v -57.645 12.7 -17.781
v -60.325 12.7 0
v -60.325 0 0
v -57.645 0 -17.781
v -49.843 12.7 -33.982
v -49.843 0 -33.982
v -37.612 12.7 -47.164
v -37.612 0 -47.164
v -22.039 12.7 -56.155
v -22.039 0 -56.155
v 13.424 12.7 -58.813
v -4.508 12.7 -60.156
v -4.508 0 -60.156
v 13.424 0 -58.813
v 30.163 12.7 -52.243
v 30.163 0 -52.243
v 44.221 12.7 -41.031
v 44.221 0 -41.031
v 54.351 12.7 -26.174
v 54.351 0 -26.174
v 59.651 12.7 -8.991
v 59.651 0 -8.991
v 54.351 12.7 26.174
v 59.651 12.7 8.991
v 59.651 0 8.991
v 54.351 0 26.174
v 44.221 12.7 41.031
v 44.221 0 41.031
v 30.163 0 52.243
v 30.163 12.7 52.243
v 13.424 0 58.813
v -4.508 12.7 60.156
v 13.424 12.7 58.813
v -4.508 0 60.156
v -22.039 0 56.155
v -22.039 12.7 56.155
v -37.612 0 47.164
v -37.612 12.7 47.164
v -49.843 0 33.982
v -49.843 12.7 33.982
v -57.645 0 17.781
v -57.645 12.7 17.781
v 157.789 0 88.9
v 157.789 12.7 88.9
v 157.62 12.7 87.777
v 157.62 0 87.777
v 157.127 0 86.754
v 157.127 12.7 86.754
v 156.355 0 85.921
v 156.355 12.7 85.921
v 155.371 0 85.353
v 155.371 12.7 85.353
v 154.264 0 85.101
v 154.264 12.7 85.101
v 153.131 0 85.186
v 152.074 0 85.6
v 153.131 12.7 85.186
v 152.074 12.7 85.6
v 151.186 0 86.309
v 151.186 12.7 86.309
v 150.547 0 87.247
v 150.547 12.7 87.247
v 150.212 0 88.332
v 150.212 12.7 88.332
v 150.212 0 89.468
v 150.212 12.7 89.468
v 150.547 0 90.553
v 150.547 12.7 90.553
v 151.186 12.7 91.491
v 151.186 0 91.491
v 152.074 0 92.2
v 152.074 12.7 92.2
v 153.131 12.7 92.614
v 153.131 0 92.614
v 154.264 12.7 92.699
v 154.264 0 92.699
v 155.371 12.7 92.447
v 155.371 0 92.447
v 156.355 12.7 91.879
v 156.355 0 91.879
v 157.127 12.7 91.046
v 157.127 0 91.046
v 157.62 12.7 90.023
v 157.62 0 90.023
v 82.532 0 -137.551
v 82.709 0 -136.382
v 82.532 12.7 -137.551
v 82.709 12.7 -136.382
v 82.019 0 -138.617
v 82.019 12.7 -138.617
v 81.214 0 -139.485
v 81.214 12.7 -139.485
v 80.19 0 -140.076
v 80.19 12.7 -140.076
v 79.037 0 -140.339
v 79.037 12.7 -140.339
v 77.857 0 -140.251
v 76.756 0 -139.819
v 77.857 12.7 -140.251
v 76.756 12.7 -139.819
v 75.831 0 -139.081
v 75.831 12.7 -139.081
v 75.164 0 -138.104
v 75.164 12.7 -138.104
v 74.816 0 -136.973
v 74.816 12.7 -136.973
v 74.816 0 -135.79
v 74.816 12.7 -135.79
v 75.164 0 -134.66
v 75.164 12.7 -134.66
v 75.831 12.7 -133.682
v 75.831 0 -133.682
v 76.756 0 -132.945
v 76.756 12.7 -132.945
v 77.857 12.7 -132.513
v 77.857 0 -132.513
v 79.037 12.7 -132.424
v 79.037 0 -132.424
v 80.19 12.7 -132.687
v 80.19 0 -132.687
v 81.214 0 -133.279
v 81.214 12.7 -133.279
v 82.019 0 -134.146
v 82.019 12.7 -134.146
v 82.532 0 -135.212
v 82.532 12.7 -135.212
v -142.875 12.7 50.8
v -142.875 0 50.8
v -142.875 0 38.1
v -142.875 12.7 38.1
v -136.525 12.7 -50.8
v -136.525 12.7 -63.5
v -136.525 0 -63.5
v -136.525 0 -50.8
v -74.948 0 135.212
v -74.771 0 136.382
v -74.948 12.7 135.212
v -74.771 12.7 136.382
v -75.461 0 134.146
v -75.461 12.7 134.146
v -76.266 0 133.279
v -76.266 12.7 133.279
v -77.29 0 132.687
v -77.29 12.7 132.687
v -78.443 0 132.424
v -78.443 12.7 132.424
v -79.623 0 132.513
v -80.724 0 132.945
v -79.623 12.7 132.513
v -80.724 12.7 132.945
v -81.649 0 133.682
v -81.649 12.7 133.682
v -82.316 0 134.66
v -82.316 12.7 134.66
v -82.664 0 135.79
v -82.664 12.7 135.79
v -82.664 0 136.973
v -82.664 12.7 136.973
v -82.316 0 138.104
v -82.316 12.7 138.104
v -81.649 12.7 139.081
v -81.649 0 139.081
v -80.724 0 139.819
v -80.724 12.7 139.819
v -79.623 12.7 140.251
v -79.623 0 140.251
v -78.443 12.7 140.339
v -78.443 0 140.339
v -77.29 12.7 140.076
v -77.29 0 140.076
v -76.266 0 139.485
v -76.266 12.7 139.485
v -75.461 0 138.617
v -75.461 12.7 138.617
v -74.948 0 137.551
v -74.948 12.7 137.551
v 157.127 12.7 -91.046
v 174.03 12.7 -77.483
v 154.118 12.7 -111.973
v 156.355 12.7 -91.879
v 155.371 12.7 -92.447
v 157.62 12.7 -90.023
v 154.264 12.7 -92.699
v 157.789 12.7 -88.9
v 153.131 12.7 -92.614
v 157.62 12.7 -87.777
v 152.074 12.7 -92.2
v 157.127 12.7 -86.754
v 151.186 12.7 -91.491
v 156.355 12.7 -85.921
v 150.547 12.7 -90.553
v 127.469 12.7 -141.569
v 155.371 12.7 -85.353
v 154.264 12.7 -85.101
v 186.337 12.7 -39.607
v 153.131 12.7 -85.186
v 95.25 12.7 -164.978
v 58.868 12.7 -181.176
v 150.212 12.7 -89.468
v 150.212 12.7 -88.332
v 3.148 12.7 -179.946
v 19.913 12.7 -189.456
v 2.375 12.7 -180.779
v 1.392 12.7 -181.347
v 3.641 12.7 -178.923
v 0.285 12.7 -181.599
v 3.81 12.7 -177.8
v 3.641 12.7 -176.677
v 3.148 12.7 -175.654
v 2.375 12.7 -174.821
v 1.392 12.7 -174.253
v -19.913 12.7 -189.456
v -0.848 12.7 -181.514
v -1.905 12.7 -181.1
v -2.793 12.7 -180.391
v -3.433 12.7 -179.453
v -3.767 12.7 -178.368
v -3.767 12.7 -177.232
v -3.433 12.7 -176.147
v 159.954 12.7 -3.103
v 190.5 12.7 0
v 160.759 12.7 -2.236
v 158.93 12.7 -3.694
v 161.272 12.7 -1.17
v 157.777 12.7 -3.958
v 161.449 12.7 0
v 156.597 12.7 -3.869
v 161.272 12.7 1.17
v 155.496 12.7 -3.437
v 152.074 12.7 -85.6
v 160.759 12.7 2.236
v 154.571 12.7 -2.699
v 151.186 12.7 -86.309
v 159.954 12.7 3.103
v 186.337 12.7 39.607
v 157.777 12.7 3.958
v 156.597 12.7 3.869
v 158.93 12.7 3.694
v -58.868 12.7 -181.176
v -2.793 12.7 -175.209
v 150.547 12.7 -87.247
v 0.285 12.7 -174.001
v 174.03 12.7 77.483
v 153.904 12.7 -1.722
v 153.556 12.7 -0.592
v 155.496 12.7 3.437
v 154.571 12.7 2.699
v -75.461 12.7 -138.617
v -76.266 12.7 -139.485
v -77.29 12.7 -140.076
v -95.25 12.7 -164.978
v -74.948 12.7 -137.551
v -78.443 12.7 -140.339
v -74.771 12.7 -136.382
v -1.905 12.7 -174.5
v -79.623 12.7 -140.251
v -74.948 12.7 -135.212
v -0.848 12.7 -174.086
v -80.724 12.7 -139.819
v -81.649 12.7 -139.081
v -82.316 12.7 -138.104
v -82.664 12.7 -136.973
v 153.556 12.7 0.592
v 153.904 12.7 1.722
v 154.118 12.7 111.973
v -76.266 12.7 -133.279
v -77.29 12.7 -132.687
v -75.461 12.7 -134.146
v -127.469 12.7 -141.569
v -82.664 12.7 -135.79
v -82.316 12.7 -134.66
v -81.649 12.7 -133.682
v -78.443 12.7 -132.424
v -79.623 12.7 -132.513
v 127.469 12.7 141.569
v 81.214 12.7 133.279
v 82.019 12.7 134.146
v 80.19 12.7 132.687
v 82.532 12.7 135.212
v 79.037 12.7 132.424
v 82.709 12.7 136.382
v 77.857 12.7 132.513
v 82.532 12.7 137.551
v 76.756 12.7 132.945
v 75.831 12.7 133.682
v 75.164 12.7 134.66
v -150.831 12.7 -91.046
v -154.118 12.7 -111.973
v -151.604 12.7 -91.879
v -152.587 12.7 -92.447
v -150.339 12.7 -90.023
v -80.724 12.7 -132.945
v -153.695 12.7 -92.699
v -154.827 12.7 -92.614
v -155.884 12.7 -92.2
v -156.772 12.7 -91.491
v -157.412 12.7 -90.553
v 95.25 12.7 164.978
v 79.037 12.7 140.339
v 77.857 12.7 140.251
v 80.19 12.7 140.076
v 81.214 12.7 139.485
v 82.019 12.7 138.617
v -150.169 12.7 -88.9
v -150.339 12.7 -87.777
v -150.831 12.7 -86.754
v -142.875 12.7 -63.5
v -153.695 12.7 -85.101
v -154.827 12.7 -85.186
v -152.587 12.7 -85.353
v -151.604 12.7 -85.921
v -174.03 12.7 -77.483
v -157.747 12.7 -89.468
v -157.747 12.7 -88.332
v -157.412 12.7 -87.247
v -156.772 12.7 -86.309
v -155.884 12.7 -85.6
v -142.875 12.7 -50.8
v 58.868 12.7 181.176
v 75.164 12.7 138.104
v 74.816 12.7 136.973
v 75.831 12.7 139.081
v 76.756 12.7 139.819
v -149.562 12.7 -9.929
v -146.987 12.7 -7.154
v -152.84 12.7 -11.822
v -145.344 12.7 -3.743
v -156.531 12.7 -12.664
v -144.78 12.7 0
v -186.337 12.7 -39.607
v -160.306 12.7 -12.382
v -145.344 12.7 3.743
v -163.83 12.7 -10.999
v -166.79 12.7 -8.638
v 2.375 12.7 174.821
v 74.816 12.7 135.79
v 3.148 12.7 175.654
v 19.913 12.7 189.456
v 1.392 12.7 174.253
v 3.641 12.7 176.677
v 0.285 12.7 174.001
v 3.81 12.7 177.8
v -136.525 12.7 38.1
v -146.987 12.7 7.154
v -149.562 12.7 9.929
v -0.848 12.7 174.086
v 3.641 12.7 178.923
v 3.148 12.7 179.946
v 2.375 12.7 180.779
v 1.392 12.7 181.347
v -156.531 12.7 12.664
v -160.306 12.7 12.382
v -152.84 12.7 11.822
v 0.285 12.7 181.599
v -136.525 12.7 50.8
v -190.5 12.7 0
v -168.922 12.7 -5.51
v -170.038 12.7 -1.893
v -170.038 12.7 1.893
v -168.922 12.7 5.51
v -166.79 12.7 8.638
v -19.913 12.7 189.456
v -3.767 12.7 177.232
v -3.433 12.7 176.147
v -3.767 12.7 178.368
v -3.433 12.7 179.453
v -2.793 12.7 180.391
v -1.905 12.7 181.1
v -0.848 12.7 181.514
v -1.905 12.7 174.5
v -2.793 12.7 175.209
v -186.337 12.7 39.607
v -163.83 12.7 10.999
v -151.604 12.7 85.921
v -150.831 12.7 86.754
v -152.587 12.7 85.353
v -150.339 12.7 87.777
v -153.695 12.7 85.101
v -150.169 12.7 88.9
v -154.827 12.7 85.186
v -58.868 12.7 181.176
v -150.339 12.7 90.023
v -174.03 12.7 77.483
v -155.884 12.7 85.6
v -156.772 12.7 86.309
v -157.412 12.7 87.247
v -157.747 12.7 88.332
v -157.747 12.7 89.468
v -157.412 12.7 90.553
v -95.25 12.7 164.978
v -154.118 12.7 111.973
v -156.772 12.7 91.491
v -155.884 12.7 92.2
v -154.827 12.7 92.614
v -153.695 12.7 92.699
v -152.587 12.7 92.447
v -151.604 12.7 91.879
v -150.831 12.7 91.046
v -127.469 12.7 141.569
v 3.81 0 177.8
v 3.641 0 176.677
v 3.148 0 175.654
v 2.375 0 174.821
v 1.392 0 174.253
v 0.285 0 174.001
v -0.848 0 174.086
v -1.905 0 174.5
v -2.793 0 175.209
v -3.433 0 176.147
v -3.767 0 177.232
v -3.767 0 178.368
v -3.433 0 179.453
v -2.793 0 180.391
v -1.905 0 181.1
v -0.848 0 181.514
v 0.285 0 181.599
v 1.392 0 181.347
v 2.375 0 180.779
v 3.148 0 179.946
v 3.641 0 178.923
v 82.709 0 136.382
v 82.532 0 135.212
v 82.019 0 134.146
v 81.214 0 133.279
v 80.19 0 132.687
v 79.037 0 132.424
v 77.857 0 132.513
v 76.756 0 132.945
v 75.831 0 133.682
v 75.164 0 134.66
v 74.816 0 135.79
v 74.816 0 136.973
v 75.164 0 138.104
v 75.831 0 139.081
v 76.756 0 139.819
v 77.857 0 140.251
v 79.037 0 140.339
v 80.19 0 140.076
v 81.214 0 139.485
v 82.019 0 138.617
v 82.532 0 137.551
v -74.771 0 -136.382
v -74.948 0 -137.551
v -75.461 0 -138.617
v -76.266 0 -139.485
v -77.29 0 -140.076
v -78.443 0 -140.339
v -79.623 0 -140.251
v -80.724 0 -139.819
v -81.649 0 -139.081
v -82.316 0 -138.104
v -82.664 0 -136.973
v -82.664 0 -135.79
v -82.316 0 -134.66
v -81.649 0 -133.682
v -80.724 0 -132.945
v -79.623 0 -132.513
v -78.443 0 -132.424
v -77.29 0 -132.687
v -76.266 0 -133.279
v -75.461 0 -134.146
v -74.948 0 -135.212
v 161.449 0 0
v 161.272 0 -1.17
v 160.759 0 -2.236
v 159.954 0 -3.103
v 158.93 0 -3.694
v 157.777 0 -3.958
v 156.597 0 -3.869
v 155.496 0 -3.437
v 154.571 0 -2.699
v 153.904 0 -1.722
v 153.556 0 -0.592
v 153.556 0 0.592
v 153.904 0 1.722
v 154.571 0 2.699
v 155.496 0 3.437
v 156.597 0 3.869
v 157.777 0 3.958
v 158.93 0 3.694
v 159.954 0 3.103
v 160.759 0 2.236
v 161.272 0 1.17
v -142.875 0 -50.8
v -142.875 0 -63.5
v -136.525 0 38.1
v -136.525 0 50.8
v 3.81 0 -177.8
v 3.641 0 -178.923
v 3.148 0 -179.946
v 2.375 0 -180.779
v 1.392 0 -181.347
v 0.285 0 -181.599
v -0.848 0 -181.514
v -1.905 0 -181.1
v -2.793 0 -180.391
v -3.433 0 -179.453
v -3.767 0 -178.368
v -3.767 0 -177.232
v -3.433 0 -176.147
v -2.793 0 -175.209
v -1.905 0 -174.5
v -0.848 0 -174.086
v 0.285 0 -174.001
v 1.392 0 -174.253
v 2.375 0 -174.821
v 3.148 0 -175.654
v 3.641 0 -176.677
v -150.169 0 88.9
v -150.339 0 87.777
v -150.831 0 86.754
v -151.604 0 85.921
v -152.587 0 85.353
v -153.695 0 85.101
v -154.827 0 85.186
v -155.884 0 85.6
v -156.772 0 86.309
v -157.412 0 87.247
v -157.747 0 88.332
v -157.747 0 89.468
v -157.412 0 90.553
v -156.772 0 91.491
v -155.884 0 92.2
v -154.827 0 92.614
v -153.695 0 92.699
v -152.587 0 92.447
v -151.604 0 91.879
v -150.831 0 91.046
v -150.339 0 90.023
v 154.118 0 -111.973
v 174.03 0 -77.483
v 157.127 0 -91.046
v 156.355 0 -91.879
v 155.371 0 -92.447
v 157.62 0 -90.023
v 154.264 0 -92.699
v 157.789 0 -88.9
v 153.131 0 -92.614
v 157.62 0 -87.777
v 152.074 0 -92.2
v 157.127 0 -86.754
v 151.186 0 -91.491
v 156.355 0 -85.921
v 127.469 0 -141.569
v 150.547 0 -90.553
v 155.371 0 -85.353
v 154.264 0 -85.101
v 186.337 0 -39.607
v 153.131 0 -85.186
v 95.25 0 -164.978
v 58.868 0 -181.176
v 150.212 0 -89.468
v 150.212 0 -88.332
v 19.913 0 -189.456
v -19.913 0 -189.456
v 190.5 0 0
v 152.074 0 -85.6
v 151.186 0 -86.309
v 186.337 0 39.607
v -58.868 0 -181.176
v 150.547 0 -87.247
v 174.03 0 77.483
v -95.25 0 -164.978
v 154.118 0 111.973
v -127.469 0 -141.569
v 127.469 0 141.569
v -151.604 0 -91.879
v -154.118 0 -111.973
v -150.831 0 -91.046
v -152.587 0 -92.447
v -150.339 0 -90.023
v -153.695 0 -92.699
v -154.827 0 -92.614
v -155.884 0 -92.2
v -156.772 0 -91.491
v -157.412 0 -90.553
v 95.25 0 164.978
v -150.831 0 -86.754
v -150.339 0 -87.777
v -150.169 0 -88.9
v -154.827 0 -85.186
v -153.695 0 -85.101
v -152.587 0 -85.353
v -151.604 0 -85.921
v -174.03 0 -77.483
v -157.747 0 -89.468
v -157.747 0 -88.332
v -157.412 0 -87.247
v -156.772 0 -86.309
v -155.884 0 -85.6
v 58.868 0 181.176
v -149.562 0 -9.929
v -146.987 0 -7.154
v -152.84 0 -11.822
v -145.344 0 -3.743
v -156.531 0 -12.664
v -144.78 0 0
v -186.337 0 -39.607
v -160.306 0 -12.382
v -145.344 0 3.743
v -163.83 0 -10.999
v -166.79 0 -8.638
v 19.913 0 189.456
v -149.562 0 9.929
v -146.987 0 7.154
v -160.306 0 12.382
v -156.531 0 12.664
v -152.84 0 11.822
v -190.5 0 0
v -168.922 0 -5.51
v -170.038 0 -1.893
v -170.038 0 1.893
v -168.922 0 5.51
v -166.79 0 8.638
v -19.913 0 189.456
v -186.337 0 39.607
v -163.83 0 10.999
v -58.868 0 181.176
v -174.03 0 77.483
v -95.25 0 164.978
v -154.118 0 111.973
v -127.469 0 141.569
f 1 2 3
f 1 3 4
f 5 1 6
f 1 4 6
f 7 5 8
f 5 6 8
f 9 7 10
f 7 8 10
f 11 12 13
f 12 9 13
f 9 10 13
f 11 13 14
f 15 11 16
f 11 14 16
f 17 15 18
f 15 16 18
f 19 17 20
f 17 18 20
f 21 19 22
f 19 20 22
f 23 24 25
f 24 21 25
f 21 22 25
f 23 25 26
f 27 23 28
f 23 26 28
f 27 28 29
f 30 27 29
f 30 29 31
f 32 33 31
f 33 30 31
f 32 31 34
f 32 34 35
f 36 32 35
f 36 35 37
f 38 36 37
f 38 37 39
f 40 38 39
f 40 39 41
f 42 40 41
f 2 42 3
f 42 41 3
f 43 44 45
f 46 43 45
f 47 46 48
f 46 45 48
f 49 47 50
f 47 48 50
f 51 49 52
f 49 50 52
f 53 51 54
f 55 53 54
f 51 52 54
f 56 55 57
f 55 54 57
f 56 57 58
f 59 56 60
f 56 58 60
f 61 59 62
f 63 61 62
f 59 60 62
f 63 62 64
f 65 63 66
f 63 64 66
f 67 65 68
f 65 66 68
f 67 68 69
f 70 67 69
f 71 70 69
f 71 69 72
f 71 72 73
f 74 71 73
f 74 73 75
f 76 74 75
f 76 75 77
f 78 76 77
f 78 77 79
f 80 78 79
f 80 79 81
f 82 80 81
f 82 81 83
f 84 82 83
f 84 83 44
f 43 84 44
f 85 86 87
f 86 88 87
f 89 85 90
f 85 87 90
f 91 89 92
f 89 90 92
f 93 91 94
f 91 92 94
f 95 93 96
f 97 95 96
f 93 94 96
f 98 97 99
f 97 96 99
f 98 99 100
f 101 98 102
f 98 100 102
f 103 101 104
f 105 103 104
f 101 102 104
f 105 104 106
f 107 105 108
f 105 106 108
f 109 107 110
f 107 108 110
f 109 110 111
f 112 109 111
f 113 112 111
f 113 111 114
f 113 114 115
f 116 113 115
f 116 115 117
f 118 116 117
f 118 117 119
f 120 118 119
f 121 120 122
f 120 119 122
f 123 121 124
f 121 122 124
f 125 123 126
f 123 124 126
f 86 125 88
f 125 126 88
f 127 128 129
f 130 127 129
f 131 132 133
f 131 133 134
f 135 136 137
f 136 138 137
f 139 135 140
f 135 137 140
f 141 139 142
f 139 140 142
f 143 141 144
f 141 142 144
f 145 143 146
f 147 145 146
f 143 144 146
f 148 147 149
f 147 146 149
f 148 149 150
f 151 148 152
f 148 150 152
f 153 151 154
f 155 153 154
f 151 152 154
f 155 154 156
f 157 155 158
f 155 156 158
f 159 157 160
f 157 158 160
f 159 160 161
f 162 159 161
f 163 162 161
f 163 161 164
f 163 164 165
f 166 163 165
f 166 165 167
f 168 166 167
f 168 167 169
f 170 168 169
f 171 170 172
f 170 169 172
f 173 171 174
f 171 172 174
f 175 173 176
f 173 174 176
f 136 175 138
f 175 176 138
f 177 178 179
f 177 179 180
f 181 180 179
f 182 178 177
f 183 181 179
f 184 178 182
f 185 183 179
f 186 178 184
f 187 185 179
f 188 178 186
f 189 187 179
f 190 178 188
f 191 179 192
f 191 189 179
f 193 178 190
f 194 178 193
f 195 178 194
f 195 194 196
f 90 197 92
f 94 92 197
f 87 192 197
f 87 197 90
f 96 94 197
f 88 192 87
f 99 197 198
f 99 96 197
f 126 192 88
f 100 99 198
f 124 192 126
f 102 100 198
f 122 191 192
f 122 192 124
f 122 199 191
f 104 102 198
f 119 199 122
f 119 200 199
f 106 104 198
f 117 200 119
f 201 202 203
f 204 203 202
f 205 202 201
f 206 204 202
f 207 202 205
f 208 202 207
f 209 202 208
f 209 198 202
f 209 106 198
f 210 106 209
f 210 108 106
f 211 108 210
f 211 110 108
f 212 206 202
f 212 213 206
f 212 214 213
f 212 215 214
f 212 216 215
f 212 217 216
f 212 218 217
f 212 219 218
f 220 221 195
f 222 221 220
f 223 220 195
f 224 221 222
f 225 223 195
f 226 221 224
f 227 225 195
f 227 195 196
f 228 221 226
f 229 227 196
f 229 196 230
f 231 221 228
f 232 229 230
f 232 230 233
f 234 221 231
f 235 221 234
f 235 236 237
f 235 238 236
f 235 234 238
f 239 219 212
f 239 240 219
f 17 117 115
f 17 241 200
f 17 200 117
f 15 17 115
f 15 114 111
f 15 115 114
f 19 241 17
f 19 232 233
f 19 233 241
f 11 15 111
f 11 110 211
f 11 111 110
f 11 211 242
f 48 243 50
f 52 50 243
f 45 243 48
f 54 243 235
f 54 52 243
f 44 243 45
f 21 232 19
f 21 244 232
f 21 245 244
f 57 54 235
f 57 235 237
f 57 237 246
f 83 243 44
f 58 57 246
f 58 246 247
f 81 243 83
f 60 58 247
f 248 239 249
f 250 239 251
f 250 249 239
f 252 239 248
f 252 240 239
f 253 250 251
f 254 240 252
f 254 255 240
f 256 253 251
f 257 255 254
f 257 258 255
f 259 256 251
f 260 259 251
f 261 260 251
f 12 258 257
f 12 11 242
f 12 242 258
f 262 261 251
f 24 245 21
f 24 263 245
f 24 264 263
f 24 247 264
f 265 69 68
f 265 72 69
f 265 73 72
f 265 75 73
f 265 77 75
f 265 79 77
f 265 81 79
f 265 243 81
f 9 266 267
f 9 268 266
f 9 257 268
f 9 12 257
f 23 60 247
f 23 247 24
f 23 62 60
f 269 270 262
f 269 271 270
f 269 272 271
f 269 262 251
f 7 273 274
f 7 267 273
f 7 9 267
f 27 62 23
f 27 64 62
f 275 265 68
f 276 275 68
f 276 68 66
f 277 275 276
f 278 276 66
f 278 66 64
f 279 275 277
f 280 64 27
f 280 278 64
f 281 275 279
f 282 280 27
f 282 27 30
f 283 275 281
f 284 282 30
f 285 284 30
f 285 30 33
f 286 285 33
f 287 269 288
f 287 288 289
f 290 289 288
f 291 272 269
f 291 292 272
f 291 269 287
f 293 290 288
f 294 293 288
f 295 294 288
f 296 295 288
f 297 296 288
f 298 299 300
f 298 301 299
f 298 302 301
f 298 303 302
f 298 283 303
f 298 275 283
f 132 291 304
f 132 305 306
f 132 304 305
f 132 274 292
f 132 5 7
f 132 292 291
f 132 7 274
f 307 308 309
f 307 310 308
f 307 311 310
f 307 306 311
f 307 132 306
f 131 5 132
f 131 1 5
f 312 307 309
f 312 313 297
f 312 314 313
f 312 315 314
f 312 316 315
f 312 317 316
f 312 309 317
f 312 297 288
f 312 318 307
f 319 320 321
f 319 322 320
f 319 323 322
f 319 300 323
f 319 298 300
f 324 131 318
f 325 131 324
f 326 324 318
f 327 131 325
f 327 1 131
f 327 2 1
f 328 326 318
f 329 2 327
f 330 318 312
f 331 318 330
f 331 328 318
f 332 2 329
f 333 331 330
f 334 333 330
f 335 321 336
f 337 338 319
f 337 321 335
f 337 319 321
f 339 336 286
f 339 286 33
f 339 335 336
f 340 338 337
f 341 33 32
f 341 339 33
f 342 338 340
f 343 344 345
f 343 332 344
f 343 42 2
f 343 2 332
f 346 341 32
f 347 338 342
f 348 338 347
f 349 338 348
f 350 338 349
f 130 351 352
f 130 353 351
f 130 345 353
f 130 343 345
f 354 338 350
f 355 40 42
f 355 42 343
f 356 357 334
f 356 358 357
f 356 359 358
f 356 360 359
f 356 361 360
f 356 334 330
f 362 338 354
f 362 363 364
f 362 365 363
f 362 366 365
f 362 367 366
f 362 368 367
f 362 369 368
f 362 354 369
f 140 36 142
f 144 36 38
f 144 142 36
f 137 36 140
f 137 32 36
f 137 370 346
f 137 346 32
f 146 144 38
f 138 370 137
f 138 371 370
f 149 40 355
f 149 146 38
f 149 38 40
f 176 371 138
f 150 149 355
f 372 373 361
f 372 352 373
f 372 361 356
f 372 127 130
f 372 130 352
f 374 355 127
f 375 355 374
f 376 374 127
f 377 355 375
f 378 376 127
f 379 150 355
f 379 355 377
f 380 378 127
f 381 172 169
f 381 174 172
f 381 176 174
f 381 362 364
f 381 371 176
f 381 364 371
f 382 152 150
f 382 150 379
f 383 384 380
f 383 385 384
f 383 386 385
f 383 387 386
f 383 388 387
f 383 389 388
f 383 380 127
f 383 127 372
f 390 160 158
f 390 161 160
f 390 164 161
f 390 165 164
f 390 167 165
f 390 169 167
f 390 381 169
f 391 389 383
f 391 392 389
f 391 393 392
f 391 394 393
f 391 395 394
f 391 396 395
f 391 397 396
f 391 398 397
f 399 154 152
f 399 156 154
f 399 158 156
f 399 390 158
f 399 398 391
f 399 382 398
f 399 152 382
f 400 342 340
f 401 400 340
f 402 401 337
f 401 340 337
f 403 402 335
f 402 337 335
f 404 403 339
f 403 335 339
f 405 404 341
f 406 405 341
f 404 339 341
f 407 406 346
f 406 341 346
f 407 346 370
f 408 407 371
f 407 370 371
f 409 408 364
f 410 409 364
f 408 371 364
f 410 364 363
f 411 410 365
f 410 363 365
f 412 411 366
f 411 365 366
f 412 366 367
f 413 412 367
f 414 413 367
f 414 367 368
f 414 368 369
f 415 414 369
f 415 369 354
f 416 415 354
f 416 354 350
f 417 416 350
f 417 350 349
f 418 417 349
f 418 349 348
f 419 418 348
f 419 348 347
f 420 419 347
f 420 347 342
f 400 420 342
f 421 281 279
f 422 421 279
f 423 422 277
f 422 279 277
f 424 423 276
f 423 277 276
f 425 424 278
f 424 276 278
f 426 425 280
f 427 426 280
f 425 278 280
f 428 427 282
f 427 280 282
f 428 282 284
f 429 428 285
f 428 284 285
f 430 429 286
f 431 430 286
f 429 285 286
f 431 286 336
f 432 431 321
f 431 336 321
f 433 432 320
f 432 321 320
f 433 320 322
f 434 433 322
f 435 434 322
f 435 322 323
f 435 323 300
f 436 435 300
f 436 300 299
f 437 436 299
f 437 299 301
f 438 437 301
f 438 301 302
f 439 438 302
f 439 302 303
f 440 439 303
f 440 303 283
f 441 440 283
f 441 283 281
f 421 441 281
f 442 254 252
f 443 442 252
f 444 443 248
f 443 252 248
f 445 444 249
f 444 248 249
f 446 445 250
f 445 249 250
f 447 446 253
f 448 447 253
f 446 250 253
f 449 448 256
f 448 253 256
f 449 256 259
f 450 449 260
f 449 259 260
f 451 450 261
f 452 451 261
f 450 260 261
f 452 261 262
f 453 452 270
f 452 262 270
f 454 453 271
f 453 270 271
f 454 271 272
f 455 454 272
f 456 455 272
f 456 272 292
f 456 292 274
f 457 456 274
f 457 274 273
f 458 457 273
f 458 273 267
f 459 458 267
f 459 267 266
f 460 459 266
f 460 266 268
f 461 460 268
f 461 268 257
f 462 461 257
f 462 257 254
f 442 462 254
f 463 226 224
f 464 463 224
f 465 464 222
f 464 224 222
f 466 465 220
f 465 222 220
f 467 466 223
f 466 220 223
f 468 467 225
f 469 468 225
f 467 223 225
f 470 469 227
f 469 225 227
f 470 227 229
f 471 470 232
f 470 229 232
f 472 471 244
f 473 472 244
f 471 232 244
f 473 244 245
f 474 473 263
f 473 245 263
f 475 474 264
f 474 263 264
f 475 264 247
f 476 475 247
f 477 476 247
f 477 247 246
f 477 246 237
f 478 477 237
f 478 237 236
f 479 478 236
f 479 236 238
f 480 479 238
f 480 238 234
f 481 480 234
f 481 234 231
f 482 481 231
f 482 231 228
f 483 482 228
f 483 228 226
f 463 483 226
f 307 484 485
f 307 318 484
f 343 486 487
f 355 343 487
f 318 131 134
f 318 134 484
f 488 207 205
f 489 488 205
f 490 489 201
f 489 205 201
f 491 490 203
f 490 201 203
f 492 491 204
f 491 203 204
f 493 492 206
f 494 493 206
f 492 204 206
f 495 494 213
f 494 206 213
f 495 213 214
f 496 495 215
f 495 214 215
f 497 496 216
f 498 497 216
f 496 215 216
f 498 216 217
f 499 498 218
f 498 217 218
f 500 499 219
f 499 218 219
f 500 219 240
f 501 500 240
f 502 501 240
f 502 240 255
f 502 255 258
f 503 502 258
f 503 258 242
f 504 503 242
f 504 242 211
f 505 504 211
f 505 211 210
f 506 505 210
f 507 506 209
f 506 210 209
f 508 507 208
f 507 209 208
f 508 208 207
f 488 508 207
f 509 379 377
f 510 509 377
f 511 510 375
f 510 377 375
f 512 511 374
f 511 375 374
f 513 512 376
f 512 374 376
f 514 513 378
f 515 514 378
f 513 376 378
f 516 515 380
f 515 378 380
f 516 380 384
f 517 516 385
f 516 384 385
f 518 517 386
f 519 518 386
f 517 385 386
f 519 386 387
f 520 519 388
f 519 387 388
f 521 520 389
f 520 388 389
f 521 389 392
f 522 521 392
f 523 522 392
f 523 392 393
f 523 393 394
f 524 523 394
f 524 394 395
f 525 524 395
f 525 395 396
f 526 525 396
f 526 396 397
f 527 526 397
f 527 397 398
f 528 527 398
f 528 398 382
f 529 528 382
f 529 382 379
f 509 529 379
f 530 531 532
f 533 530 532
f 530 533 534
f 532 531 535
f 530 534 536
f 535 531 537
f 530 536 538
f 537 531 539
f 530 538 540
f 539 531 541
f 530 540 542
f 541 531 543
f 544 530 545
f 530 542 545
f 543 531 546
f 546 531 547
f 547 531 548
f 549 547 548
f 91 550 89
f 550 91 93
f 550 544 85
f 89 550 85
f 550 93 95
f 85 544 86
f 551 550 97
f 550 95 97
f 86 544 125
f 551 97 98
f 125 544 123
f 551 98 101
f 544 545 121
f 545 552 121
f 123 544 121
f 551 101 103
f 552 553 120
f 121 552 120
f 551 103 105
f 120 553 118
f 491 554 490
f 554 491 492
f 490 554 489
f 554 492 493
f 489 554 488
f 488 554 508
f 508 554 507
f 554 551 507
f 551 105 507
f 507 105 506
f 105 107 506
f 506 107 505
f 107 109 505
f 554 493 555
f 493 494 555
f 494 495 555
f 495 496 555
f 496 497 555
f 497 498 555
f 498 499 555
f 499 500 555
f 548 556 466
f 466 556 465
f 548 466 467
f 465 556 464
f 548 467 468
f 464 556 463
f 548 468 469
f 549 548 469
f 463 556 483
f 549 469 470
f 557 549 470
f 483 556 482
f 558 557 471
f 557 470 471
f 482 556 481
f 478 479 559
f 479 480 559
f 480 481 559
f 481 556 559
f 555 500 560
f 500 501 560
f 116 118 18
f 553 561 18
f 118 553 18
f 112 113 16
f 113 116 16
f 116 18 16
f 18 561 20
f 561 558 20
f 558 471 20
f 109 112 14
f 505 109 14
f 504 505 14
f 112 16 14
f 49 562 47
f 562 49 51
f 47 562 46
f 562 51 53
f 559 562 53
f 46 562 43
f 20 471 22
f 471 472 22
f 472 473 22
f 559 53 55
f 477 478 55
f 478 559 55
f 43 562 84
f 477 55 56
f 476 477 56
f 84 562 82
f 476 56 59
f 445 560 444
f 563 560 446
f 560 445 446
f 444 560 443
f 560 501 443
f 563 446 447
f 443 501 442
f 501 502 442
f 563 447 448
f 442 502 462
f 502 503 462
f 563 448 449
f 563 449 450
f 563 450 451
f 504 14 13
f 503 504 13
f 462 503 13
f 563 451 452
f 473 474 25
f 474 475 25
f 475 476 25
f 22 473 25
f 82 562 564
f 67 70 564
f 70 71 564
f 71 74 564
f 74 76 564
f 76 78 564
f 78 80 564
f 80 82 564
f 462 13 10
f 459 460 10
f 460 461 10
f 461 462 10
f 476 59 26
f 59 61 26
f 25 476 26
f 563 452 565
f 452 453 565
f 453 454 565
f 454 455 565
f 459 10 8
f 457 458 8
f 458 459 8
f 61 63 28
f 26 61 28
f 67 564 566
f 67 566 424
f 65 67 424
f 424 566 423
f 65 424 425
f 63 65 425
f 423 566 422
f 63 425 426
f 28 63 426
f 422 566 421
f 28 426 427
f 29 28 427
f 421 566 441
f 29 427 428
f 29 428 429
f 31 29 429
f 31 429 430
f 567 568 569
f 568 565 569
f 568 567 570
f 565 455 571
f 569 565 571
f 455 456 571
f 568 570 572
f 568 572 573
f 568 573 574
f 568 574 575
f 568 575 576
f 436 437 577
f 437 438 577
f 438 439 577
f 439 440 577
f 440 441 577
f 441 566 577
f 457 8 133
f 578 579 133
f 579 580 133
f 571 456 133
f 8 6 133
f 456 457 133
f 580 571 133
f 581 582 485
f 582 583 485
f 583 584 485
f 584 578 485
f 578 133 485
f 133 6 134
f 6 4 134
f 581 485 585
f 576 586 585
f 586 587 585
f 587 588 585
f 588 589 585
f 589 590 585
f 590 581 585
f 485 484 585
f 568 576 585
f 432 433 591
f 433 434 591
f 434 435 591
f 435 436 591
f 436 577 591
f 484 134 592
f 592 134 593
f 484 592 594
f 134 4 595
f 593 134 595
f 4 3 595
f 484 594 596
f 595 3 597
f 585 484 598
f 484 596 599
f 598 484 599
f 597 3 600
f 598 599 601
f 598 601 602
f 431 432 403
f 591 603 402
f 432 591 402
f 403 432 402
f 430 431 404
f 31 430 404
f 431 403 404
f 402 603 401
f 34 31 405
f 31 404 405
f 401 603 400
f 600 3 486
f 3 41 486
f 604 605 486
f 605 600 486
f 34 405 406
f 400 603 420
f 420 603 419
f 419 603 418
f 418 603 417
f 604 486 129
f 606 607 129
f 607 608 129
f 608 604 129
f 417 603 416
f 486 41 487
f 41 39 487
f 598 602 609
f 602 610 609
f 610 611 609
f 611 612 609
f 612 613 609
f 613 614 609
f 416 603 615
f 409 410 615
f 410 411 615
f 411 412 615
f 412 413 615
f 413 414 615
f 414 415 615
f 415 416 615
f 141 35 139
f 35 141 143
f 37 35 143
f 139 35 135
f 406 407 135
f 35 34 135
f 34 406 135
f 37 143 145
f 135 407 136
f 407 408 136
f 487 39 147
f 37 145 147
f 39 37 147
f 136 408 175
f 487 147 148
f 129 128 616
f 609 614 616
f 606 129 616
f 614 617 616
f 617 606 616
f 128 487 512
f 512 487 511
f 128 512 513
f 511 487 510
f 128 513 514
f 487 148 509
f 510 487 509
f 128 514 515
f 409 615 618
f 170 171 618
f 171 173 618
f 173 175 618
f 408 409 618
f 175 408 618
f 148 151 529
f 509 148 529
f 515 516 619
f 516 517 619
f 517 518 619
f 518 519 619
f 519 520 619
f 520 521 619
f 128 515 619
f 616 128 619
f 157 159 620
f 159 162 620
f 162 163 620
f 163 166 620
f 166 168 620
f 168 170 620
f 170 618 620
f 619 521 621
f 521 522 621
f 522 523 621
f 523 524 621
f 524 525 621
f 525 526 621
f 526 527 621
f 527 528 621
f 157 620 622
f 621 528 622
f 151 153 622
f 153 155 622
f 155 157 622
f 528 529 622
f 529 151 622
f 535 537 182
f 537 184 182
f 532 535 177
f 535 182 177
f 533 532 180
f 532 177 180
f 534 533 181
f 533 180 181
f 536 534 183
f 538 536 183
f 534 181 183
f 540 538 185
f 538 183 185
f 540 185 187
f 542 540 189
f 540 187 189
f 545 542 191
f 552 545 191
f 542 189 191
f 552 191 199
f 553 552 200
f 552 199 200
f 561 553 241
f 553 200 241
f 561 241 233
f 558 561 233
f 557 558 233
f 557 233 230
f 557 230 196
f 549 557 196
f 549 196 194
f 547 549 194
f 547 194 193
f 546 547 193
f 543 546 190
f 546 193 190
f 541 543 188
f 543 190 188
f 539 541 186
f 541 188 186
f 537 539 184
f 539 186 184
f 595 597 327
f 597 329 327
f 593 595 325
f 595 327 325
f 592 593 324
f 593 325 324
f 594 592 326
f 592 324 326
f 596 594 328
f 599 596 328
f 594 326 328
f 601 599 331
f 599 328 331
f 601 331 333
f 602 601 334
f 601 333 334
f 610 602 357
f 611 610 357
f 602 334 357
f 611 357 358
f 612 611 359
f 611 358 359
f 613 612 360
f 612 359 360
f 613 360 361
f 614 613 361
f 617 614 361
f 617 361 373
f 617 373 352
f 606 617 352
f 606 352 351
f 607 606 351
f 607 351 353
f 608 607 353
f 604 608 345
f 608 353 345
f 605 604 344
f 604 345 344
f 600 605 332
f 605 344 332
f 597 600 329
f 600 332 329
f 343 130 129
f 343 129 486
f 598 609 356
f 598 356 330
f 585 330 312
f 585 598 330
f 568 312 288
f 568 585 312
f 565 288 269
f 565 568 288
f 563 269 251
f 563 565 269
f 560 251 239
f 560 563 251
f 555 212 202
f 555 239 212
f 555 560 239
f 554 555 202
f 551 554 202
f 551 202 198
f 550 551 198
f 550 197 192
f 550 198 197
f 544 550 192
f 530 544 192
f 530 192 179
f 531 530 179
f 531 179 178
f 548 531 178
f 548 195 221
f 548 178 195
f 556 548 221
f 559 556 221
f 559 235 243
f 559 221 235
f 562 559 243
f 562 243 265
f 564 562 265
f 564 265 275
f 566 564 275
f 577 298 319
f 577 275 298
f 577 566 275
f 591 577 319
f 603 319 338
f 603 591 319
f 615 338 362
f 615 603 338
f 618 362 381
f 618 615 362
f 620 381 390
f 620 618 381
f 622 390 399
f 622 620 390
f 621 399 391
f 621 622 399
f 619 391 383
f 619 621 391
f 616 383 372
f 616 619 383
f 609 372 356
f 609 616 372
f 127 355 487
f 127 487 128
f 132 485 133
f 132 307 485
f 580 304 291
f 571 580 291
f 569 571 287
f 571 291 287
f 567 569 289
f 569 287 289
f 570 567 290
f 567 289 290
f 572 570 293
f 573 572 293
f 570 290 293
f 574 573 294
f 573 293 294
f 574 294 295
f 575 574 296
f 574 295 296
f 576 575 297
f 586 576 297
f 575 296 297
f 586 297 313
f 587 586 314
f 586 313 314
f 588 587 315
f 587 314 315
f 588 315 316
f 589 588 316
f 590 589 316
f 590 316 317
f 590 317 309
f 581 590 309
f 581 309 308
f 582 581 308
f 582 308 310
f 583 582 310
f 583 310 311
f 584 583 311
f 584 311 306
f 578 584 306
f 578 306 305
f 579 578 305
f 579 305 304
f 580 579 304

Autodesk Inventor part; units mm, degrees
ref_plane "YZ Plane" through (0, 0, 0) normal (1, 0, 0) x (0, 1, 0)
ref_plane "XZ Plane" through (0, 0, 0) normal (0, 1, 0) x (-1, 0, 0)
ref_plane "XY Plane" through (0, 0, 0) normal (0, 0, 1) x (1, 0, 0)
sketch "Sketch1" plane through (0, 0, 0) normal (0, 1, 0) x (-1, 0, 0)
  circle A0 centre (0, 0) radius 190.5
  circle A1 centre (0, 0) radius 60.325
  dimension "d0" = 381
  dimension "d1" = 120.65
extrude "Extrusion1" add sketch "Sketch1" along normal blind 12.7
sketch "Sketch2" plane through (0, 12.7, 0) normal (0, 1, 0) x (1, 0, 0)
  line L0 (-142.875, 63.5) -> (-136.525, 63.5)
  line L1 (-136.525, 63.5) -> (-136.525, 50.8)
  line L2 (-136.525, 50.8) -> (-142.875, 50.8)
  line L3 (-142.875, 50.8) -> (-142.875, 63.5)
  line L4 (-136.525, 50.8) -> (-136.525, -50.8) construction
  line L5 (-111.125, 50.8) -> (-212.725, 50.8) construction
  line L6 (-136.525, -50.8) -> (-142.875, -50.8)
  line L7 (-142.875, -50.8) -> (-142.875, -38.1)
  line L8 (-142.875, -38.1) -> (-136.525, -38.1)
  line L9 (-136.525, -38.1) -> (-136.525, -50.8)
  line L10 (-136.525, 0) -> (-60.325, 0) construction
  line L11 (-136.525, 0) -> (-60.325, 0) construction
  circle A0 centre (0, 0) radius 85.725 construction
  line L12 (0, 0) -> (-85.725, 0) construction
  dimension "d4" = 6.35
  dimension "d5" = 12.7
  dimension "d6" = 101.6
  dimension "d7" = 90
  dimension "d8" = 6.35
  dimension "d9" = 12.7
  dimension "d10" = 76.2
  dimension "d11" = 0
extrude "Extrusion2" cut sketch "Sketch2" against normal through all
sketch "Sketch3" plane through (0, 12.7, 0) normal (0, 1, 0) x (1, 0, 0)
  circle A0 centre (0, 0) radius 157.48 construction
  circle A1 centre (-157.48, 0) radius 3.9687
  circle A2 centre (-78.74, -136.3817) radius 3.9687
  circle A3 centre (78.74, -136.3817) radius 3.9687
  circle A4 centre (157.48, 0) radius 3.9687
  circle A5 centre (78.74, 136.3817) radius 3.9687
  circle A6 centre (-78.74, 136.3817) radius 3.9687
  dimension "d16" = 314.96
  dimension "d17" = 7.9375
  dimension "d18" = 360
extrude "Extrusion3" cut sketch "Sketch3" against normal through all
sketch "Sketch4" plane through (0, 12.7, 0) normal (0, 1, 0) x (1, 0, 0)
  line L0 (0, 0) -> (0, -177.8) construction
  line L1 (0, 0) -> (177.8, 0) construction
  circle A0 centre (0, -177.8) radius 3.81
  circle A1 centre (153.9793, -88.9) radius 3.81
  circle A2 centre (153.9793, 88.9) radius 3.81
  circle A3 centre (0, 177.8) radius 3.81
  circle A4 centre (-153.9793, 88.9) radius 3.81
  circle A5 centre (-153.9793, -88.9) radius 3.81
  dimension "d21" = 177.8
  dimension "d22" = 90
  dimension "d23" = 7.62
  dimension "d26" = 360
extrude "Extrusion4" cut sketch "Sketch4" against normal through all
sketch "Sketch5" plane through (0, 12.7, 0) normal (0, 1, 0) x (1, 0, 0)
  circle A0 centre (-157.48, 0) radius 3.9687 projected
  circle A1 centre (-157.48, 0) radius 12.7
  point P0 (0, 0)
  dimension "d30" = 25.4
extrude "Extrusion5" cut sketch "Sketch5" against normal through all
equation "\"d4\" = d8"
properties part number "Turntable Top" material "PVC-Piping"
